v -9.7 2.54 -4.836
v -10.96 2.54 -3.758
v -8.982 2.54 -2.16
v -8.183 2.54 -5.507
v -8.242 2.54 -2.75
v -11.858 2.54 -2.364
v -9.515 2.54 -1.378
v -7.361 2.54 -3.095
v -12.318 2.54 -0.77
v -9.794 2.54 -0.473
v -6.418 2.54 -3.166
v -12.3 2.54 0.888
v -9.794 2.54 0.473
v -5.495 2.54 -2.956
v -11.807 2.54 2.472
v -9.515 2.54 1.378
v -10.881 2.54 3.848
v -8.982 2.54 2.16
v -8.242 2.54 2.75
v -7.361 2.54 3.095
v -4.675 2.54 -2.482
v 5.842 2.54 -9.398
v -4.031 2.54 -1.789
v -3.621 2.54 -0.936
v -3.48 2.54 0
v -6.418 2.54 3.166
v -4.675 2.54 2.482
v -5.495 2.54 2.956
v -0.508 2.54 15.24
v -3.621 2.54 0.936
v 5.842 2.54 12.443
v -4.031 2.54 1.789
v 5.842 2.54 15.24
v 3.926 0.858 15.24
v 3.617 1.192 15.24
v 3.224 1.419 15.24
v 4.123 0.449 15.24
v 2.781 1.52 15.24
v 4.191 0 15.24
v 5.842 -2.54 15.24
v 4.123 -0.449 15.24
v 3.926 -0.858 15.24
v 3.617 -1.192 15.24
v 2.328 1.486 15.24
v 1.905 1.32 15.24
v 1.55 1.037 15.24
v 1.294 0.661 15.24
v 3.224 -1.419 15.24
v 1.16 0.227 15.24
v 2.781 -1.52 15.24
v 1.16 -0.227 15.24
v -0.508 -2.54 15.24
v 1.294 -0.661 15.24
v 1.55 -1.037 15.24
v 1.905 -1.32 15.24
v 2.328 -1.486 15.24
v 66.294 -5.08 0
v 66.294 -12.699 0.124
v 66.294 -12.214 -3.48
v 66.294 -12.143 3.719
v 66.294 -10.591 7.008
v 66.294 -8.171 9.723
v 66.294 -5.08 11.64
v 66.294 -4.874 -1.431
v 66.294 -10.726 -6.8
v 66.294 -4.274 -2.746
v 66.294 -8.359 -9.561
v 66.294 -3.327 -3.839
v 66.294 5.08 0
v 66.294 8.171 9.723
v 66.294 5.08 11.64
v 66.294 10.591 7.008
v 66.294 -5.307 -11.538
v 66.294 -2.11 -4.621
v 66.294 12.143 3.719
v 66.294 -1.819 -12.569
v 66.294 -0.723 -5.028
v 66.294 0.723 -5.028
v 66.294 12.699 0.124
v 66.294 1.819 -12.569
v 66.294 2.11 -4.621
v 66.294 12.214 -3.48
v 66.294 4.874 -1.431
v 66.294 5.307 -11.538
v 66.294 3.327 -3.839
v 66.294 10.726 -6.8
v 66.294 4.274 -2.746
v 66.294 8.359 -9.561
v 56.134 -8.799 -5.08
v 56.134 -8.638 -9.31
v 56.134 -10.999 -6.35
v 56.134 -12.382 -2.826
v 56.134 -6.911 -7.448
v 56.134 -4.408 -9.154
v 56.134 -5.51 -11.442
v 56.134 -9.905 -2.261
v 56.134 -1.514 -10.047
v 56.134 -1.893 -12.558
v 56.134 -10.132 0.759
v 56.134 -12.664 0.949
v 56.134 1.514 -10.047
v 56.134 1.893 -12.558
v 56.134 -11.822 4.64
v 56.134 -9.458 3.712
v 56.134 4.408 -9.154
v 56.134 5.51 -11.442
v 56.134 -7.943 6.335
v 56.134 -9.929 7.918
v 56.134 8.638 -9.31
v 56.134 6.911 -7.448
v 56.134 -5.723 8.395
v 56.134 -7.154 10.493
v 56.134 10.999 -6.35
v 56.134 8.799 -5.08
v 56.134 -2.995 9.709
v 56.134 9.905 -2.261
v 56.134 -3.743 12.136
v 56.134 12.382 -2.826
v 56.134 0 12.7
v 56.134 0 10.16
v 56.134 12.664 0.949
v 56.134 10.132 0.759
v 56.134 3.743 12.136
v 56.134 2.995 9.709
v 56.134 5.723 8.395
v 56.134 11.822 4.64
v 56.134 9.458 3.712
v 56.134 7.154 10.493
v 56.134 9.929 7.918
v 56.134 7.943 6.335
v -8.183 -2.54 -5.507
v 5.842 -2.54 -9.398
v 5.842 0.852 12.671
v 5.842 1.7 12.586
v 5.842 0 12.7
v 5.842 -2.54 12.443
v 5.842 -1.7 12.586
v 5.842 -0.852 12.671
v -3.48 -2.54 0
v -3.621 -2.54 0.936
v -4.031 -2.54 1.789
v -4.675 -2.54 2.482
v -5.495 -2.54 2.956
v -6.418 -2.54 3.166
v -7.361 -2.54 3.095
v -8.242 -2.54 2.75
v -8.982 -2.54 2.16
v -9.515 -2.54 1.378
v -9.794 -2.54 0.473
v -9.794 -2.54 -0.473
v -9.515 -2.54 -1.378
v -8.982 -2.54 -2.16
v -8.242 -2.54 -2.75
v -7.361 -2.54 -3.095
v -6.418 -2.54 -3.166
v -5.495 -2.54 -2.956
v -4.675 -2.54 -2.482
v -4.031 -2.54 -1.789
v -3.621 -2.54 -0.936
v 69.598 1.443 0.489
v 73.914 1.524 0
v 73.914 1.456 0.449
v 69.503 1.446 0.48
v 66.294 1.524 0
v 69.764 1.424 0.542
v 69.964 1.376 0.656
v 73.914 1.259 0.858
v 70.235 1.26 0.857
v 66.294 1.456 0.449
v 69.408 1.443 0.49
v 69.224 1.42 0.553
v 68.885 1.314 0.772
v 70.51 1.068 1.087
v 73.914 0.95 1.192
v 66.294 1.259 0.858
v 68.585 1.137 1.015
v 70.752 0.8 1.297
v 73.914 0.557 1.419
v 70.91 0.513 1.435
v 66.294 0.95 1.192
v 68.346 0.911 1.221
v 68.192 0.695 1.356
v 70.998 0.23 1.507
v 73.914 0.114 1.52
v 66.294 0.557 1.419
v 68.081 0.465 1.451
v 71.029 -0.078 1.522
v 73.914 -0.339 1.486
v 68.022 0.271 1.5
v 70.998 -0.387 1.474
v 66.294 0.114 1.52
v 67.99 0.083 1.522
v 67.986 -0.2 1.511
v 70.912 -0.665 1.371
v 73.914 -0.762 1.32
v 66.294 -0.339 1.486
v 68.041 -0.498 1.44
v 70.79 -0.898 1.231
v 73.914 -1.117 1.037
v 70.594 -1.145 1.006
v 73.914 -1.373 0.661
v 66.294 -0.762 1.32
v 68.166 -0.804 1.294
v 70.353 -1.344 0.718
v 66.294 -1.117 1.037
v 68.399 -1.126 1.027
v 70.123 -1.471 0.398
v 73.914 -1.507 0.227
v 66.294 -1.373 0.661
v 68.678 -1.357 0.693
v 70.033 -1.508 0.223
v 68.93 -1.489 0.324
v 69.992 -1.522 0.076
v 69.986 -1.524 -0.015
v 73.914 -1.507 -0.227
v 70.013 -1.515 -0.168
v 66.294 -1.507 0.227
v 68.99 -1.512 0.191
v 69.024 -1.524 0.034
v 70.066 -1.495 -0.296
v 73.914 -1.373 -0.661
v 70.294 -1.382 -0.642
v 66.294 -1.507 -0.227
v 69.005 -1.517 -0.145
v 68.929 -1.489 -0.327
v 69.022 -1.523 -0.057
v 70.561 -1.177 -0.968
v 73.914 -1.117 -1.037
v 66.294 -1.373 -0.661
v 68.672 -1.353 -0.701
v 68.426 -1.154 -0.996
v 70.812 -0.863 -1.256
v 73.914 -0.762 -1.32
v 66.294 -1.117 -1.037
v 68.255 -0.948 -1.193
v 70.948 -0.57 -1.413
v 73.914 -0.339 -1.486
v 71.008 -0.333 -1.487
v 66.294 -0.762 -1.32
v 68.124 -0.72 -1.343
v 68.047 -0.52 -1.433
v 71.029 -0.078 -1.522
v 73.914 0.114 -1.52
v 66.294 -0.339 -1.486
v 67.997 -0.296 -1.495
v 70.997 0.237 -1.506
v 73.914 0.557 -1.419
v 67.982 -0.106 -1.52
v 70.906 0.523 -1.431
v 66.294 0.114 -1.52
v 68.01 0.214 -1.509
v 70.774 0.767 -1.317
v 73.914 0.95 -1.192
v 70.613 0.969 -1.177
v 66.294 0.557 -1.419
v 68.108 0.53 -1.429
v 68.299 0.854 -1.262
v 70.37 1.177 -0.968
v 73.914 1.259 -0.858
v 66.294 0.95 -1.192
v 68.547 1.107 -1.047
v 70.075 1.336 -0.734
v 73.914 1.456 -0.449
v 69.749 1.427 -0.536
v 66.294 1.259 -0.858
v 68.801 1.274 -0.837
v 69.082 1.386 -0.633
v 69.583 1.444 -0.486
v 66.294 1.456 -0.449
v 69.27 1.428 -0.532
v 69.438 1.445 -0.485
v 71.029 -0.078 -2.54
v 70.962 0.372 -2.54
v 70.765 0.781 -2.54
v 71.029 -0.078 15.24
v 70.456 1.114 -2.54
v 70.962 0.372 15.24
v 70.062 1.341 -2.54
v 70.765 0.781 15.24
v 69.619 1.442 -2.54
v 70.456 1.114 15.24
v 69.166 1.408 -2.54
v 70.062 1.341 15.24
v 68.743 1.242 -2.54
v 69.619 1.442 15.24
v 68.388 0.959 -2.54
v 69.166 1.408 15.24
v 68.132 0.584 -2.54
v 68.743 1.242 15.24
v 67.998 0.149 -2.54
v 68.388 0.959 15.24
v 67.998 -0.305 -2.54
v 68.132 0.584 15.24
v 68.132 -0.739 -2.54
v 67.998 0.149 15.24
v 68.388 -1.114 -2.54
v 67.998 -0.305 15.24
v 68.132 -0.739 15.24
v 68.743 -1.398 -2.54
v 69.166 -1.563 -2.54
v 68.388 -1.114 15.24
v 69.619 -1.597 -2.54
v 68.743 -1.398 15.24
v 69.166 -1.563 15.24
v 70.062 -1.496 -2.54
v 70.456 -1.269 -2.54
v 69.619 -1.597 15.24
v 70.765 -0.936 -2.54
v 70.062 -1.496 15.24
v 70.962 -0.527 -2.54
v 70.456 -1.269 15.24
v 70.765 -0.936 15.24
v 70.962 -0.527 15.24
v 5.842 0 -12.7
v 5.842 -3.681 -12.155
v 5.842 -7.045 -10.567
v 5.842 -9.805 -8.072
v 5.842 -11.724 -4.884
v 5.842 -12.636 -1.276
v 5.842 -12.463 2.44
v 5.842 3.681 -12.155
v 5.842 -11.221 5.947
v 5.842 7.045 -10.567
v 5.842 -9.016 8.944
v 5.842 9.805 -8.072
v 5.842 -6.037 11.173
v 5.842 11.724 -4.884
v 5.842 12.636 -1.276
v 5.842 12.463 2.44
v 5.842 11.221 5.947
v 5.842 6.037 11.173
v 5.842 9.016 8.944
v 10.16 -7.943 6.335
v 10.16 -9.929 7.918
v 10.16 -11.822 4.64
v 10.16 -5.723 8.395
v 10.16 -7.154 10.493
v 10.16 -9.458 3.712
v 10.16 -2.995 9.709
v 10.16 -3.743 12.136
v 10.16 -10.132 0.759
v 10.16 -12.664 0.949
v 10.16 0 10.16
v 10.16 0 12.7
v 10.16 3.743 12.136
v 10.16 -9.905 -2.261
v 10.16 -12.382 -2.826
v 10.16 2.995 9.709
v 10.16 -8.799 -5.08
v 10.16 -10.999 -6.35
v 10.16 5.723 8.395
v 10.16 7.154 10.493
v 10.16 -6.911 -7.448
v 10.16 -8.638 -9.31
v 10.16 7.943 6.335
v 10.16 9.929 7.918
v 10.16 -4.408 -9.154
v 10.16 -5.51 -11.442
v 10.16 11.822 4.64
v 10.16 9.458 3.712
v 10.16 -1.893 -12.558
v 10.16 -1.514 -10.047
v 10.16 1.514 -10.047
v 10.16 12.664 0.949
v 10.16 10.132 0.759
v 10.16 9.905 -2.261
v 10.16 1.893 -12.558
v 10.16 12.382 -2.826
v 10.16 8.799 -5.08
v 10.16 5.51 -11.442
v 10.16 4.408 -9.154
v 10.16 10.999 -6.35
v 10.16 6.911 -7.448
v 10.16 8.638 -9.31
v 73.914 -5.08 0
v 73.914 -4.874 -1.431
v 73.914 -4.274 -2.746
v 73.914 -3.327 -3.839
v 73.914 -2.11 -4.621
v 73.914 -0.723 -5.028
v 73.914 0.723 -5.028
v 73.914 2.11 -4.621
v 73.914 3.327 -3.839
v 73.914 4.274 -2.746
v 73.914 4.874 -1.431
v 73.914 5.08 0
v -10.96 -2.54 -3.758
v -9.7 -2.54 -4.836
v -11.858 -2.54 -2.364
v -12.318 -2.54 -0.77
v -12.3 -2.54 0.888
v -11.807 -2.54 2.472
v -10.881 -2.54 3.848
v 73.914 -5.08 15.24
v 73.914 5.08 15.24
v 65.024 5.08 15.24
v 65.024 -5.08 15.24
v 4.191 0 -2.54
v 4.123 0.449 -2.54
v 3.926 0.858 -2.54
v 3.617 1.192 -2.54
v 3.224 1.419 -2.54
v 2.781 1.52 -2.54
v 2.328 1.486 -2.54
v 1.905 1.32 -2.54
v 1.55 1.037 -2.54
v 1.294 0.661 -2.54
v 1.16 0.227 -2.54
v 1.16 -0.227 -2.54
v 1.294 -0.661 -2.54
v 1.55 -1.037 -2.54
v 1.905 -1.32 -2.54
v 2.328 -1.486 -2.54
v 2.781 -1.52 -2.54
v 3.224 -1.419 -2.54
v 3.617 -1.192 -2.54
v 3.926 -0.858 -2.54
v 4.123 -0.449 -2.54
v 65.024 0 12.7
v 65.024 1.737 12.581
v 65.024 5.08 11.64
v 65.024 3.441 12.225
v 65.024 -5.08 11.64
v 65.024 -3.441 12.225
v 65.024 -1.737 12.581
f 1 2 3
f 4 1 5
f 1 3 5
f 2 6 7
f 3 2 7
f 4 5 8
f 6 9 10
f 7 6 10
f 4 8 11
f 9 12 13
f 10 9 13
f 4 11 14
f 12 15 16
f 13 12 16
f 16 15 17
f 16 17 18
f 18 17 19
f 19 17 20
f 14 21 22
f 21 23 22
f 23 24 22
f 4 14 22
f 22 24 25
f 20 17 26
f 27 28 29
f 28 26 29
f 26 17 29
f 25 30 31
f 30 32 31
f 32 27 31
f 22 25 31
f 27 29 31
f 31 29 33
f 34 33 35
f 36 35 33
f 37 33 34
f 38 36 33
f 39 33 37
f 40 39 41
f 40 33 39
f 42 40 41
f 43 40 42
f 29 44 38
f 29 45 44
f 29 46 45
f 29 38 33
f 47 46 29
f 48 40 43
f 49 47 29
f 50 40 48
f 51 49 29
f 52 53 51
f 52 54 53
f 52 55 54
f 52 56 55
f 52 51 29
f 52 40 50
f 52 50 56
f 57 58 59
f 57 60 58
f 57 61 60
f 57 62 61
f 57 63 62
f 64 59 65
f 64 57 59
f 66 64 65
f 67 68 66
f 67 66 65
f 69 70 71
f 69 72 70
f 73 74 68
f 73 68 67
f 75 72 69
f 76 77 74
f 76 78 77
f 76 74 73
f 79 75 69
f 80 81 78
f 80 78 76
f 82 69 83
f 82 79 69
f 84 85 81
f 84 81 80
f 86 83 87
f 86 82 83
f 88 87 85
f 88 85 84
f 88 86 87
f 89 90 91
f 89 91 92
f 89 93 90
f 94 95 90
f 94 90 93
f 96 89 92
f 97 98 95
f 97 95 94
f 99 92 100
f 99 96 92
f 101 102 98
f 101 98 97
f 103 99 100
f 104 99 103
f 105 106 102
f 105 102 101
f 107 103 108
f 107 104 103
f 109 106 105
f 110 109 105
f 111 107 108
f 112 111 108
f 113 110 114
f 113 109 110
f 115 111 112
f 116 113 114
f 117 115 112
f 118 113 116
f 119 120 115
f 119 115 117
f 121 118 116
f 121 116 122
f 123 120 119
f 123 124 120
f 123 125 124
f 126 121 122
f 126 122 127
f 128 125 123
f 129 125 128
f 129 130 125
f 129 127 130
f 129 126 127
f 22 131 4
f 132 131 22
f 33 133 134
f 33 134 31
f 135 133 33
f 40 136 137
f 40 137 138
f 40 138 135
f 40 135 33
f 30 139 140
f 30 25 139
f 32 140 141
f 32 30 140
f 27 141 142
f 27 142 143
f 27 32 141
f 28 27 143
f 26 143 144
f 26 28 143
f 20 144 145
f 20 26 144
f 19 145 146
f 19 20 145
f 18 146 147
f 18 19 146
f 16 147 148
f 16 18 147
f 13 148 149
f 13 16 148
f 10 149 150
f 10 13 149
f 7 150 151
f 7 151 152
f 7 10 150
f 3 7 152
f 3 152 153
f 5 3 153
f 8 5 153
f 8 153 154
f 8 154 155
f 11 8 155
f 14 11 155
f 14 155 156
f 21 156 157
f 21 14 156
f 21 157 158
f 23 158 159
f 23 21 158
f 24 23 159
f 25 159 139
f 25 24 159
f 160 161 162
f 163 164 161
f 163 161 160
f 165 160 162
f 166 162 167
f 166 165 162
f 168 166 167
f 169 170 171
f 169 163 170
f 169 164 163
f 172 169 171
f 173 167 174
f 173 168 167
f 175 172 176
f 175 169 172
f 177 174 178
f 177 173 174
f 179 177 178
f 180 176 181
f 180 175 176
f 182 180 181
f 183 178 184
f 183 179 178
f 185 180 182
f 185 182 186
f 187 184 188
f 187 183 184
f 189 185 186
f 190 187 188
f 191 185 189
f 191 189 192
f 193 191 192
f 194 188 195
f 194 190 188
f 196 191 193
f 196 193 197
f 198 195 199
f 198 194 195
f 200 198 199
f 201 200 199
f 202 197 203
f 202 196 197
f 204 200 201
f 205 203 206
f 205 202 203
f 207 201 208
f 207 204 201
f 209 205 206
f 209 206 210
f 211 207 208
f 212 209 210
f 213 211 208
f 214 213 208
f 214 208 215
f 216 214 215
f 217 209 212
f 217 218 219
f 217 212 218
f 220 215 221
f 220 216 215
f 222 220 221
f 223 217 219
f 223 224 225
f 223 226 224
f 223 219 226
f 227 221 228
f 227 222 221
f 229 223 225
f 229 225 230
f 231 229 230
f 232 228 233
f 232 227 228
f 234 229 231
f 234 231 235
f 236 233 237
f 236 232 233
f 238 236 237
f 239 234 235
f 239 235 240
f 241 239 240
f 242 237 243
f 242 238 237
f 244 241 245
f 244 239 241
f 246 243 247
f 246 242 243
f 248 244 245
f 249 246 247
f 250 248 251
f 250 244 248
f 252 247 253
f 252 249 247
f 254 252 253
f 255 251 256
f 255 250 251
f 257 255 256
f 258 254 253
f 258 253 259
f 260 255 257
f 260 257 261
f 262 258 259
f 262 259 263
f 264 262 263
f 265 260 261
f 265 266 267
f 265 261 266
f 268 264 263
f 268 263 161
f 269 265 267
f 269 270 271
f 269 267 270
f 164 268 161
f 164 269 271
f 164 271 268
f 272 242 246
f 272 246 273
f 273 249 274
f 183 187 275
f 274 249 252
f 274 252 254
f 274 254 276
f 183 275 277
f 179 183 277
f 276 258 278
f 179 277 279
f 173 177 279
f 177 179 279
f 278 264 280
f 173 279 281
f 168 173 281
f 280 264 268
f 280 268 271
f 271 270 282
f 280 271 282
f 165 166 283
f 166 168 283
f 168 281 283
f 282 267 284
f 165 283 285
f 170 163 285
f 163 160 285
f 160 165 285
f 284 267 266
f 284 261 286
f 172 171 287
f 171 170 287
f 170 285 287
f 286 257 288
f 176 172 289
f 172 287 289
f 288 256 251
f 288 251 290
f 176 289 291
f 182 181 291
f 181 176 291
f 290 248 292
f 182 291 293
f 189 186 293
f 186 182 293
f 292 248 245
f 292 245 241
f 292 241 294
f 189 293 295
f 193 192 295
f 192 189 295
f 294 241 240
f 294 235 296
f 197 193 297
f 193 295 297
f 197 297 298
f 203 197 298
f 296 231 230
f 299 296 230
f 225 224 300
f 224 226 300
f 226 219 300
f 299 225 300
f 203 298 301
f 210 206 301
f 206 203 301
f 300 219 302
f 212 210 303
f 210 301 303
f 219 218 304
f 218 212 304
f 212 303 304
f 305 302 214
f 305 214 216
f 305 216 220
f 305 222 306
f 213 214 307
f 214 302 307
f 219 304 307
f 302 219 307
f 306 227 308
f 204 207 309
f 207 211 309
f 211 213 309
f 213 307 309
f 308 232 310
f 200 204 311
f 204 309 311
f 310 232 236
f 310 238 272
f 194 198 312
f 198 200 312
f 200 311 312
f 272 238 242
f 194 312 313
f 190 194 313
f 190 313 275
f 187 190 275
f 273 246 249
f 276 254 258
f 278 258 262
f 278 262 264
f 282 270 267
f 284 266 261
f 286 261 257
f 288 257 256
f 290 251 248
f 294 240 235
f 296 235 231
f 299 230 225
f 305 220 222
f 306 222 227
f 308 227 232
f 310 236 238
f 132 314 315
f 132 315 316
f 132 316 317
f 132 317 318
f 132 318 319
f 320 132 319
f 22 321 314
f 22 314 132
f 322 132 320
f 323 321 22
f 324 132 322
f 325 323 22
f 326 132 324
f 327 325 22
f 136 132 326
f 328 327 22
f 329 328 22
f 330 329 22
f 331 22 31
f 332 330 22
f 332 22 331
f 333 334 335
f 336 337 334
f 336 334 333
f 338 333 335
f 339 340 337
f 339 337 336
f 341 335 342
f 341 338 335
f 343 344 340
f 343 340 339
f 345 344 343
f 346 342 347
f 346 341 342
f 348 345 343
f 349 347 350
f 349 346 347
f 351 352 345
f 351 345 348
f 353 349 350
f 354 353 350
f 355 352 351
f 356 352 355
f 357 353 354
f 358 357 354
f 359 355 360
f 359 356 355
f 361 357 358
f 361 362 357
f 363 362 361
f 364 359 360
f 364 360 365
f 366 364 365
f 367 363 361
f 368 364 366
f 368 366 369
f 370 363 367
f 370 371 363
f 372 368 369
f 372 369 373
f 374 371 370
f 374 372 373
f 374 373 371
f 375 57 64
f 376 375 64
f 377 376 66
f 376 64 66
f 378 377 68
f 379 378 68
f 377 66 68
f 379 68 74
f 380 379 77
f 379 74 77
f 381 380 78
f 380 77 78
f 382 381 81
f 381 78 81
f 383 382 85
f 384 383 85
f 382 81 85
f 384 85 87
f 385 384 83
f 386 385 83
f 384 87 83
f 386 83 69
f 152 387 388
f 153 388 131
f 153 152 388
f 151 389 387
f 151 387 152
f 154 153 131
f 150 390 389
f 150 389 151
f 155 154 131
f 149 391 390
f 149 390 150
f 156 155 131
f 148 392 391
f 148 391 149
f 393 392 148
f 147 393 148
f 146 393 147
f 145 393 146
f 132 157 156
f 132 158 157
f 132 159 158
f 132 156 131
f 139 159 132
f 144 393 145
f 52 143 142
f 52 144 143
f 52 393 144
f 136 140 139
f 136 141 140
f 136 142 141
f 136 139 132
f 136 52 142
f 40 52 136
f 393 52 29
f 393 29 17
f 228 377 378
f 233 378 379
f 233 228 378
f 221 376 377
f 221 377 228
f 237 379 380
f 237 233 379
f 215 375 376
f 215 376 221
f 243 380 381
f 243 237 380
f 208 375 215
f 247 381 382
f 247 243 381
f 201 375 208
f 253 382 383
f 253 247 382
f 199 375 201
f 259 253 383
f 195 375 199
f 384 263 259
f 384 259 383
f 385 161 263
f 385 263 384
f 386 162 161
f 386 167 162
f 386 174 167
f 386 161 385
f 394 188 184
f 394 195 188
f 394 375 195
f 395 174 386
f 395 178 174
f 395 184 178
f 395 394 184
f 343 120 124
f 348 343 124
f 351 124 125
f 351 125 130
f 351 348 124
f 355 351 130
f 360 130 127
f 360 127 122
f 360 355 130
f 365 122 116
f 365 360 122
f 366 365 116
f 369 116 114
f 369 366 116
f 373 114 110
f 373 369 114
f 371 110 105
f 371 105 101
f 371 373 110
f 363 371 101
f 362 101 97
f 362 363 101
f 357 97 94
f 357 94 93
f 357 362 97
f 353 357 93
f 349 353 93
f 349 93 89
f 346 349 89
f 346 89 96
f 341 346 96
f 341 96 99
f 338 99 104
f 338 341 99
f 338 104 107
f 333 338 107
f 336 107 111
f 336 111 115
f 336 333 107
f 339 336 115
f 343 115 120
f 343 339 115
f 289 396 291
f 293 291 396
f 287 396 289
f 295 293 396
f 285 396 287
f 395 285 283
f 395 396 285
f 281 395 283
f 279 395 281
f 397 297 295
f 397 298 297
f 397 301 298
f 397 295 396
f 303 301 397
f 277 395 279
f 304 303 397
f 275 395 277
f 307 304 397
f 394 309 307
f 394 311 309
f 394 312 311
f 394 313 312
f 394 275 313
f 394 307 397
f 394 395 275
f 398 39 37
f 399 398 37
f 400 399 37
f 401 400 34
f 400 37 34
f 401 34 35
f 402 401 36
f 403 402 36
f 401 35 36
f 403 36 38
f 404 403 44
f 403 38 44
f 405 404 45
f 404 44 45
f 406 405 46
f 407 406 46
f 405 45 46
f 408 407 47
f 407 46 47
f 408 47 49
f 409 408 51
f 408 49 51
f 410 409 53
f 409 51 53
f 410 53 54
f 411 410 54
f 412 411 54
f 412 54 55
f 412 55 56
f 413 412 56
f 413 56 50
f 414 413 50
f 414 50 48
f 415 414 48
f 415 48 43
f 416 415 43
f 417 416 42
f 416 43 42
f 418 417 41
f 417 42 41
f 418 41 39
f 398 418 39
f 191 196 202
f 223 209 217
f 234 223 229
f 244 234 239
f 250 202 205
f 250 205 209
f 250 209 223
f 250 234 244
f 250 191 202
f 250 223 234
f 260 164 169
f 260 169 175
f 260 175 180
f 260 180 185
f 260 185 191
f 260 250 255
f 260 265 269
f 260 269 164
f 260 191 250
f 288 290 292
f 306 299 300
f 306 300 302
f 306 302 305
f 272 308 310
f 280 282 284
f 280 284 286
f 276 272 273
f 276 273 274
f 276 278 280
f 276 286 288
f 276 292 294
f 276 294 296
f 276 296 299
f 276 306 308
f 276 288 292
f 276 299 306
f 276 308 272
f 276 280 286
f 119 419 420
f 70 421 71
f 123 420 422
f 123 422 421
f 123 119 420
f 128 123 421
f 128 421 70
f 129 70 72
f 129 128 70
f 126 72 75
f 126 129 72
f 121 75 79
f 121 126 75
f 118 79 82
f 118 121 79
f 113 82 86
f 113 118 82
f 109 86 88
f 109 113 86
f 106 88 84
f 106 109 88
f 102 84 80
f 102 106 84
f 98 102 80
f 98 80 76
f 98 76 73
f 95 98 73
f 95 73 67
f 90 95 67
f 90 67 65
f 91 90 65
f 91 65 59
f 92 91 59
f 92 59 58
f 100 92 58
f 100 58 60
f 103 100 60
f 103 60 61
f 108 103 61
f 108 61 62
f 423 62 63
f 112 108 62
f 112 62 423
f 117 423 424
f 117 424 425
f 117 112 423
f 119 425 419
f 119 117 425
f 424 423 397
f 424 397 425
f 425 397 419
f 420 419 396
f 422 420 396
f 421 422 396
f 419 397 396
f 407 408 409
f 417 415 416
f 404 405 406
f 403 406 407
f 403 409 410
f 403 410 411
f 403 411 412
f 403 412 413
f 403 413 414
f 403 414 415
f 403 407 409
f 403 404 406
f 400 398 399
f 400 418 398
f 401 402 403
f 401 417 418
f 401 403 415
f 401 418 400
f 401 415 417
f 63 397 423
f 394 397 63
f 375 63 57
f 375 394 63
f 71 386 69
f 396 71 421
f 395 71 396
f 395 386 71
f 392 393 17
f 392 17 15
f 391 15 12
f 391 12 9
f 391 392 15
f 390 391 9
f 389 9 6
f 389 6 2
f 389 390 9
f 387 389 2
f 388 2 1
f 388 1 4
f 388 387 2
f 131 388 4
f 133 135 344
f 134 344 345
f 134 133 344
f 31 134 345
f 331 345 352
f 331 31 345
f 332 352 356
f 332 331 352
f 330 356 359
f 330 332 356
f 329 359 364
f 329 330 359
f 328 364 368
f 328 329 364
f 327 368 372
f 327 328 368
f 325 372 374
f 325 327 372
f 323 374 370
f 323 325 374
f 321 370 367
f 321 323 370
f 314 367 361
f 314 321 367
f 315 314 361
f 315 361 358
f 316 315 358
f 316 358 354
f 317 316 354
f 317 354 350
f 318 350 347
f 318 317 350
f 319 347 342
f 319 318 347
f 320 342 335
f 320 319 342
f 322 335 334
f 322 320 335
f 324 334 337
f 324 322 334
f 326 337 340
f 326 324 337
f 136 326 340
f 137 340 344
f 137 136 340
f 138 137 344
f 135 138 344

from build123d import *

# Parameters (mm, degrees)
F0_R          = 3.175
F0_W          = 5.842
F0_H          = 12.7
F2_DEPTH      = 2.54
F3_R          = 1.524
F4_DEPTH      = 7.62
F4_DEPTH_BACK = 1.27
F5_R          = 1.524
F6_DEPTH      = 17.78


with BuildPart() as f1:
    # F0 (on Front) → F1 (revolve)
    with BuildSketch(Plane.XZ):
        Polygon((5.842, 12.7), (5.842, 0), (66.294, 0), (66.294, 12.7), (56.134, 12.7), (56.134, 10.16), (10.16, 10.16), (10.16, 12.7), align=None)
    revolve(axis=Axis((33.147, 0, 0), (-1, 0, 0)))

    # F0 (on Front) → F2 (join, symmetric)
    with BuildSketch(Plane.XZ):
        with BuildLine():
            Line((5.842, 0), (0, 0))
            Line((0, 0), (-0.9398, 0))
            ThreePointArc((-0.9398, 0), (-3.1957909266, -4.5493385486), (-8.1826630726, -5.5069827884))
            Line((-8.1826630726, -5.5069827884), (5.842, -9.398))
            Line((5.842, -9.398), (5.842, 0))
        make_face()
        with BuildLine():
            ThreePointArc((-8.1826630726, -5.5069827884), (-3.1957909266, -4.5493385486), (-0.9398, 0))
            ThreePointArc((-0.9398, 0), (-4.5919612295, 5.3297205562), (-10.8806298187, 3.8475430269))
            ThreePointArc((-10.8806298187, 3.8475430269), (-12.1459778134, -1.5837270034), (-8.1826630726, -5.5069827884))
        make_face()
        with Locations((-6.6548, 0)):
            Circle(F0_R, mode=Mode.SUBTRACT)
        with BuildLine():
            Line((-0.9398, 0), (0, 0))
            Line((0, 0), (0, 12.7))
            Line((0, 12.7), (5.842, 12.7))
            Line((5.842, 12.7), (5.842, 15.24))
            Line((5.842, 15.24), (-0.508, 15.24))
            Line((-0.508, 15.24), (-10.8806298187, 3.8475430269))
            ThreePointArc((-10.8806298187, 3.8475430269), (-4.5919612295, 5.3297205562), (-0.9398, 0))
        make_face()
        with Locations((2.921, 6.35)):
            Rectangle(F0_W, F0_H)
    extrude(amount=F2_DEPTH, both=True)

    # F3 (on face) → F4 (join, two sides)
    with BuildSketch(Plane.YZ.offset(66.294)) as f4_sk:
        with BuildLine():
            ThreePointArc((-5.08, 0), (0, -5.08), (5.08, 0))
            ThreePointArc((5.08, 0), (0, 5.08), (-5.08, 0))
        make_face()
        Circle(F3_R, mode=Mode.SUBTRACT)
        with BuildLine():
            ThreePointArc((-5.08, 0), (0, 5.08), (5.08, 0))
            Line((5.08, 0), (5.08, 11.6397422652))
            ThreePointArc((5.08, 11.6397422652), (0, 12.7), (-5.08, 11.6397422652))
            Line((-5.08, 11.6397422652), (-5.08, 0))
        make_face()
        with BuildLine():
            ThreePointArc((-5.08, 11.6397422652), (0, 12.7), (5.08, 11.6397422652))
            Line((5.08, 11.6397422652), (5.08, 15.24))
            Line((5.08, 15.24), (-5.08, 15.24))
            Line((-5.08, 15.24), (-5.08, 11.6397422652))
        make_face()
    extrude(amount=F4_DEPTH)
    extrude(f4_sk.sketch, amount=-F4_DEPTH_BACK)

    # F5 (on face) → F6 (cut)
    with BuildSketch(Plane.XY.offset(15.24)):
        with Locations((2.667, 0)):
            Circle(F5_R)
        with Locations((69.5054605603, -0.0776998204)):
            Circle(F5_R)
    extrude(amount=-F6_DEPTH, mode=Mode.SUBTRACT)


solid = f1.part
